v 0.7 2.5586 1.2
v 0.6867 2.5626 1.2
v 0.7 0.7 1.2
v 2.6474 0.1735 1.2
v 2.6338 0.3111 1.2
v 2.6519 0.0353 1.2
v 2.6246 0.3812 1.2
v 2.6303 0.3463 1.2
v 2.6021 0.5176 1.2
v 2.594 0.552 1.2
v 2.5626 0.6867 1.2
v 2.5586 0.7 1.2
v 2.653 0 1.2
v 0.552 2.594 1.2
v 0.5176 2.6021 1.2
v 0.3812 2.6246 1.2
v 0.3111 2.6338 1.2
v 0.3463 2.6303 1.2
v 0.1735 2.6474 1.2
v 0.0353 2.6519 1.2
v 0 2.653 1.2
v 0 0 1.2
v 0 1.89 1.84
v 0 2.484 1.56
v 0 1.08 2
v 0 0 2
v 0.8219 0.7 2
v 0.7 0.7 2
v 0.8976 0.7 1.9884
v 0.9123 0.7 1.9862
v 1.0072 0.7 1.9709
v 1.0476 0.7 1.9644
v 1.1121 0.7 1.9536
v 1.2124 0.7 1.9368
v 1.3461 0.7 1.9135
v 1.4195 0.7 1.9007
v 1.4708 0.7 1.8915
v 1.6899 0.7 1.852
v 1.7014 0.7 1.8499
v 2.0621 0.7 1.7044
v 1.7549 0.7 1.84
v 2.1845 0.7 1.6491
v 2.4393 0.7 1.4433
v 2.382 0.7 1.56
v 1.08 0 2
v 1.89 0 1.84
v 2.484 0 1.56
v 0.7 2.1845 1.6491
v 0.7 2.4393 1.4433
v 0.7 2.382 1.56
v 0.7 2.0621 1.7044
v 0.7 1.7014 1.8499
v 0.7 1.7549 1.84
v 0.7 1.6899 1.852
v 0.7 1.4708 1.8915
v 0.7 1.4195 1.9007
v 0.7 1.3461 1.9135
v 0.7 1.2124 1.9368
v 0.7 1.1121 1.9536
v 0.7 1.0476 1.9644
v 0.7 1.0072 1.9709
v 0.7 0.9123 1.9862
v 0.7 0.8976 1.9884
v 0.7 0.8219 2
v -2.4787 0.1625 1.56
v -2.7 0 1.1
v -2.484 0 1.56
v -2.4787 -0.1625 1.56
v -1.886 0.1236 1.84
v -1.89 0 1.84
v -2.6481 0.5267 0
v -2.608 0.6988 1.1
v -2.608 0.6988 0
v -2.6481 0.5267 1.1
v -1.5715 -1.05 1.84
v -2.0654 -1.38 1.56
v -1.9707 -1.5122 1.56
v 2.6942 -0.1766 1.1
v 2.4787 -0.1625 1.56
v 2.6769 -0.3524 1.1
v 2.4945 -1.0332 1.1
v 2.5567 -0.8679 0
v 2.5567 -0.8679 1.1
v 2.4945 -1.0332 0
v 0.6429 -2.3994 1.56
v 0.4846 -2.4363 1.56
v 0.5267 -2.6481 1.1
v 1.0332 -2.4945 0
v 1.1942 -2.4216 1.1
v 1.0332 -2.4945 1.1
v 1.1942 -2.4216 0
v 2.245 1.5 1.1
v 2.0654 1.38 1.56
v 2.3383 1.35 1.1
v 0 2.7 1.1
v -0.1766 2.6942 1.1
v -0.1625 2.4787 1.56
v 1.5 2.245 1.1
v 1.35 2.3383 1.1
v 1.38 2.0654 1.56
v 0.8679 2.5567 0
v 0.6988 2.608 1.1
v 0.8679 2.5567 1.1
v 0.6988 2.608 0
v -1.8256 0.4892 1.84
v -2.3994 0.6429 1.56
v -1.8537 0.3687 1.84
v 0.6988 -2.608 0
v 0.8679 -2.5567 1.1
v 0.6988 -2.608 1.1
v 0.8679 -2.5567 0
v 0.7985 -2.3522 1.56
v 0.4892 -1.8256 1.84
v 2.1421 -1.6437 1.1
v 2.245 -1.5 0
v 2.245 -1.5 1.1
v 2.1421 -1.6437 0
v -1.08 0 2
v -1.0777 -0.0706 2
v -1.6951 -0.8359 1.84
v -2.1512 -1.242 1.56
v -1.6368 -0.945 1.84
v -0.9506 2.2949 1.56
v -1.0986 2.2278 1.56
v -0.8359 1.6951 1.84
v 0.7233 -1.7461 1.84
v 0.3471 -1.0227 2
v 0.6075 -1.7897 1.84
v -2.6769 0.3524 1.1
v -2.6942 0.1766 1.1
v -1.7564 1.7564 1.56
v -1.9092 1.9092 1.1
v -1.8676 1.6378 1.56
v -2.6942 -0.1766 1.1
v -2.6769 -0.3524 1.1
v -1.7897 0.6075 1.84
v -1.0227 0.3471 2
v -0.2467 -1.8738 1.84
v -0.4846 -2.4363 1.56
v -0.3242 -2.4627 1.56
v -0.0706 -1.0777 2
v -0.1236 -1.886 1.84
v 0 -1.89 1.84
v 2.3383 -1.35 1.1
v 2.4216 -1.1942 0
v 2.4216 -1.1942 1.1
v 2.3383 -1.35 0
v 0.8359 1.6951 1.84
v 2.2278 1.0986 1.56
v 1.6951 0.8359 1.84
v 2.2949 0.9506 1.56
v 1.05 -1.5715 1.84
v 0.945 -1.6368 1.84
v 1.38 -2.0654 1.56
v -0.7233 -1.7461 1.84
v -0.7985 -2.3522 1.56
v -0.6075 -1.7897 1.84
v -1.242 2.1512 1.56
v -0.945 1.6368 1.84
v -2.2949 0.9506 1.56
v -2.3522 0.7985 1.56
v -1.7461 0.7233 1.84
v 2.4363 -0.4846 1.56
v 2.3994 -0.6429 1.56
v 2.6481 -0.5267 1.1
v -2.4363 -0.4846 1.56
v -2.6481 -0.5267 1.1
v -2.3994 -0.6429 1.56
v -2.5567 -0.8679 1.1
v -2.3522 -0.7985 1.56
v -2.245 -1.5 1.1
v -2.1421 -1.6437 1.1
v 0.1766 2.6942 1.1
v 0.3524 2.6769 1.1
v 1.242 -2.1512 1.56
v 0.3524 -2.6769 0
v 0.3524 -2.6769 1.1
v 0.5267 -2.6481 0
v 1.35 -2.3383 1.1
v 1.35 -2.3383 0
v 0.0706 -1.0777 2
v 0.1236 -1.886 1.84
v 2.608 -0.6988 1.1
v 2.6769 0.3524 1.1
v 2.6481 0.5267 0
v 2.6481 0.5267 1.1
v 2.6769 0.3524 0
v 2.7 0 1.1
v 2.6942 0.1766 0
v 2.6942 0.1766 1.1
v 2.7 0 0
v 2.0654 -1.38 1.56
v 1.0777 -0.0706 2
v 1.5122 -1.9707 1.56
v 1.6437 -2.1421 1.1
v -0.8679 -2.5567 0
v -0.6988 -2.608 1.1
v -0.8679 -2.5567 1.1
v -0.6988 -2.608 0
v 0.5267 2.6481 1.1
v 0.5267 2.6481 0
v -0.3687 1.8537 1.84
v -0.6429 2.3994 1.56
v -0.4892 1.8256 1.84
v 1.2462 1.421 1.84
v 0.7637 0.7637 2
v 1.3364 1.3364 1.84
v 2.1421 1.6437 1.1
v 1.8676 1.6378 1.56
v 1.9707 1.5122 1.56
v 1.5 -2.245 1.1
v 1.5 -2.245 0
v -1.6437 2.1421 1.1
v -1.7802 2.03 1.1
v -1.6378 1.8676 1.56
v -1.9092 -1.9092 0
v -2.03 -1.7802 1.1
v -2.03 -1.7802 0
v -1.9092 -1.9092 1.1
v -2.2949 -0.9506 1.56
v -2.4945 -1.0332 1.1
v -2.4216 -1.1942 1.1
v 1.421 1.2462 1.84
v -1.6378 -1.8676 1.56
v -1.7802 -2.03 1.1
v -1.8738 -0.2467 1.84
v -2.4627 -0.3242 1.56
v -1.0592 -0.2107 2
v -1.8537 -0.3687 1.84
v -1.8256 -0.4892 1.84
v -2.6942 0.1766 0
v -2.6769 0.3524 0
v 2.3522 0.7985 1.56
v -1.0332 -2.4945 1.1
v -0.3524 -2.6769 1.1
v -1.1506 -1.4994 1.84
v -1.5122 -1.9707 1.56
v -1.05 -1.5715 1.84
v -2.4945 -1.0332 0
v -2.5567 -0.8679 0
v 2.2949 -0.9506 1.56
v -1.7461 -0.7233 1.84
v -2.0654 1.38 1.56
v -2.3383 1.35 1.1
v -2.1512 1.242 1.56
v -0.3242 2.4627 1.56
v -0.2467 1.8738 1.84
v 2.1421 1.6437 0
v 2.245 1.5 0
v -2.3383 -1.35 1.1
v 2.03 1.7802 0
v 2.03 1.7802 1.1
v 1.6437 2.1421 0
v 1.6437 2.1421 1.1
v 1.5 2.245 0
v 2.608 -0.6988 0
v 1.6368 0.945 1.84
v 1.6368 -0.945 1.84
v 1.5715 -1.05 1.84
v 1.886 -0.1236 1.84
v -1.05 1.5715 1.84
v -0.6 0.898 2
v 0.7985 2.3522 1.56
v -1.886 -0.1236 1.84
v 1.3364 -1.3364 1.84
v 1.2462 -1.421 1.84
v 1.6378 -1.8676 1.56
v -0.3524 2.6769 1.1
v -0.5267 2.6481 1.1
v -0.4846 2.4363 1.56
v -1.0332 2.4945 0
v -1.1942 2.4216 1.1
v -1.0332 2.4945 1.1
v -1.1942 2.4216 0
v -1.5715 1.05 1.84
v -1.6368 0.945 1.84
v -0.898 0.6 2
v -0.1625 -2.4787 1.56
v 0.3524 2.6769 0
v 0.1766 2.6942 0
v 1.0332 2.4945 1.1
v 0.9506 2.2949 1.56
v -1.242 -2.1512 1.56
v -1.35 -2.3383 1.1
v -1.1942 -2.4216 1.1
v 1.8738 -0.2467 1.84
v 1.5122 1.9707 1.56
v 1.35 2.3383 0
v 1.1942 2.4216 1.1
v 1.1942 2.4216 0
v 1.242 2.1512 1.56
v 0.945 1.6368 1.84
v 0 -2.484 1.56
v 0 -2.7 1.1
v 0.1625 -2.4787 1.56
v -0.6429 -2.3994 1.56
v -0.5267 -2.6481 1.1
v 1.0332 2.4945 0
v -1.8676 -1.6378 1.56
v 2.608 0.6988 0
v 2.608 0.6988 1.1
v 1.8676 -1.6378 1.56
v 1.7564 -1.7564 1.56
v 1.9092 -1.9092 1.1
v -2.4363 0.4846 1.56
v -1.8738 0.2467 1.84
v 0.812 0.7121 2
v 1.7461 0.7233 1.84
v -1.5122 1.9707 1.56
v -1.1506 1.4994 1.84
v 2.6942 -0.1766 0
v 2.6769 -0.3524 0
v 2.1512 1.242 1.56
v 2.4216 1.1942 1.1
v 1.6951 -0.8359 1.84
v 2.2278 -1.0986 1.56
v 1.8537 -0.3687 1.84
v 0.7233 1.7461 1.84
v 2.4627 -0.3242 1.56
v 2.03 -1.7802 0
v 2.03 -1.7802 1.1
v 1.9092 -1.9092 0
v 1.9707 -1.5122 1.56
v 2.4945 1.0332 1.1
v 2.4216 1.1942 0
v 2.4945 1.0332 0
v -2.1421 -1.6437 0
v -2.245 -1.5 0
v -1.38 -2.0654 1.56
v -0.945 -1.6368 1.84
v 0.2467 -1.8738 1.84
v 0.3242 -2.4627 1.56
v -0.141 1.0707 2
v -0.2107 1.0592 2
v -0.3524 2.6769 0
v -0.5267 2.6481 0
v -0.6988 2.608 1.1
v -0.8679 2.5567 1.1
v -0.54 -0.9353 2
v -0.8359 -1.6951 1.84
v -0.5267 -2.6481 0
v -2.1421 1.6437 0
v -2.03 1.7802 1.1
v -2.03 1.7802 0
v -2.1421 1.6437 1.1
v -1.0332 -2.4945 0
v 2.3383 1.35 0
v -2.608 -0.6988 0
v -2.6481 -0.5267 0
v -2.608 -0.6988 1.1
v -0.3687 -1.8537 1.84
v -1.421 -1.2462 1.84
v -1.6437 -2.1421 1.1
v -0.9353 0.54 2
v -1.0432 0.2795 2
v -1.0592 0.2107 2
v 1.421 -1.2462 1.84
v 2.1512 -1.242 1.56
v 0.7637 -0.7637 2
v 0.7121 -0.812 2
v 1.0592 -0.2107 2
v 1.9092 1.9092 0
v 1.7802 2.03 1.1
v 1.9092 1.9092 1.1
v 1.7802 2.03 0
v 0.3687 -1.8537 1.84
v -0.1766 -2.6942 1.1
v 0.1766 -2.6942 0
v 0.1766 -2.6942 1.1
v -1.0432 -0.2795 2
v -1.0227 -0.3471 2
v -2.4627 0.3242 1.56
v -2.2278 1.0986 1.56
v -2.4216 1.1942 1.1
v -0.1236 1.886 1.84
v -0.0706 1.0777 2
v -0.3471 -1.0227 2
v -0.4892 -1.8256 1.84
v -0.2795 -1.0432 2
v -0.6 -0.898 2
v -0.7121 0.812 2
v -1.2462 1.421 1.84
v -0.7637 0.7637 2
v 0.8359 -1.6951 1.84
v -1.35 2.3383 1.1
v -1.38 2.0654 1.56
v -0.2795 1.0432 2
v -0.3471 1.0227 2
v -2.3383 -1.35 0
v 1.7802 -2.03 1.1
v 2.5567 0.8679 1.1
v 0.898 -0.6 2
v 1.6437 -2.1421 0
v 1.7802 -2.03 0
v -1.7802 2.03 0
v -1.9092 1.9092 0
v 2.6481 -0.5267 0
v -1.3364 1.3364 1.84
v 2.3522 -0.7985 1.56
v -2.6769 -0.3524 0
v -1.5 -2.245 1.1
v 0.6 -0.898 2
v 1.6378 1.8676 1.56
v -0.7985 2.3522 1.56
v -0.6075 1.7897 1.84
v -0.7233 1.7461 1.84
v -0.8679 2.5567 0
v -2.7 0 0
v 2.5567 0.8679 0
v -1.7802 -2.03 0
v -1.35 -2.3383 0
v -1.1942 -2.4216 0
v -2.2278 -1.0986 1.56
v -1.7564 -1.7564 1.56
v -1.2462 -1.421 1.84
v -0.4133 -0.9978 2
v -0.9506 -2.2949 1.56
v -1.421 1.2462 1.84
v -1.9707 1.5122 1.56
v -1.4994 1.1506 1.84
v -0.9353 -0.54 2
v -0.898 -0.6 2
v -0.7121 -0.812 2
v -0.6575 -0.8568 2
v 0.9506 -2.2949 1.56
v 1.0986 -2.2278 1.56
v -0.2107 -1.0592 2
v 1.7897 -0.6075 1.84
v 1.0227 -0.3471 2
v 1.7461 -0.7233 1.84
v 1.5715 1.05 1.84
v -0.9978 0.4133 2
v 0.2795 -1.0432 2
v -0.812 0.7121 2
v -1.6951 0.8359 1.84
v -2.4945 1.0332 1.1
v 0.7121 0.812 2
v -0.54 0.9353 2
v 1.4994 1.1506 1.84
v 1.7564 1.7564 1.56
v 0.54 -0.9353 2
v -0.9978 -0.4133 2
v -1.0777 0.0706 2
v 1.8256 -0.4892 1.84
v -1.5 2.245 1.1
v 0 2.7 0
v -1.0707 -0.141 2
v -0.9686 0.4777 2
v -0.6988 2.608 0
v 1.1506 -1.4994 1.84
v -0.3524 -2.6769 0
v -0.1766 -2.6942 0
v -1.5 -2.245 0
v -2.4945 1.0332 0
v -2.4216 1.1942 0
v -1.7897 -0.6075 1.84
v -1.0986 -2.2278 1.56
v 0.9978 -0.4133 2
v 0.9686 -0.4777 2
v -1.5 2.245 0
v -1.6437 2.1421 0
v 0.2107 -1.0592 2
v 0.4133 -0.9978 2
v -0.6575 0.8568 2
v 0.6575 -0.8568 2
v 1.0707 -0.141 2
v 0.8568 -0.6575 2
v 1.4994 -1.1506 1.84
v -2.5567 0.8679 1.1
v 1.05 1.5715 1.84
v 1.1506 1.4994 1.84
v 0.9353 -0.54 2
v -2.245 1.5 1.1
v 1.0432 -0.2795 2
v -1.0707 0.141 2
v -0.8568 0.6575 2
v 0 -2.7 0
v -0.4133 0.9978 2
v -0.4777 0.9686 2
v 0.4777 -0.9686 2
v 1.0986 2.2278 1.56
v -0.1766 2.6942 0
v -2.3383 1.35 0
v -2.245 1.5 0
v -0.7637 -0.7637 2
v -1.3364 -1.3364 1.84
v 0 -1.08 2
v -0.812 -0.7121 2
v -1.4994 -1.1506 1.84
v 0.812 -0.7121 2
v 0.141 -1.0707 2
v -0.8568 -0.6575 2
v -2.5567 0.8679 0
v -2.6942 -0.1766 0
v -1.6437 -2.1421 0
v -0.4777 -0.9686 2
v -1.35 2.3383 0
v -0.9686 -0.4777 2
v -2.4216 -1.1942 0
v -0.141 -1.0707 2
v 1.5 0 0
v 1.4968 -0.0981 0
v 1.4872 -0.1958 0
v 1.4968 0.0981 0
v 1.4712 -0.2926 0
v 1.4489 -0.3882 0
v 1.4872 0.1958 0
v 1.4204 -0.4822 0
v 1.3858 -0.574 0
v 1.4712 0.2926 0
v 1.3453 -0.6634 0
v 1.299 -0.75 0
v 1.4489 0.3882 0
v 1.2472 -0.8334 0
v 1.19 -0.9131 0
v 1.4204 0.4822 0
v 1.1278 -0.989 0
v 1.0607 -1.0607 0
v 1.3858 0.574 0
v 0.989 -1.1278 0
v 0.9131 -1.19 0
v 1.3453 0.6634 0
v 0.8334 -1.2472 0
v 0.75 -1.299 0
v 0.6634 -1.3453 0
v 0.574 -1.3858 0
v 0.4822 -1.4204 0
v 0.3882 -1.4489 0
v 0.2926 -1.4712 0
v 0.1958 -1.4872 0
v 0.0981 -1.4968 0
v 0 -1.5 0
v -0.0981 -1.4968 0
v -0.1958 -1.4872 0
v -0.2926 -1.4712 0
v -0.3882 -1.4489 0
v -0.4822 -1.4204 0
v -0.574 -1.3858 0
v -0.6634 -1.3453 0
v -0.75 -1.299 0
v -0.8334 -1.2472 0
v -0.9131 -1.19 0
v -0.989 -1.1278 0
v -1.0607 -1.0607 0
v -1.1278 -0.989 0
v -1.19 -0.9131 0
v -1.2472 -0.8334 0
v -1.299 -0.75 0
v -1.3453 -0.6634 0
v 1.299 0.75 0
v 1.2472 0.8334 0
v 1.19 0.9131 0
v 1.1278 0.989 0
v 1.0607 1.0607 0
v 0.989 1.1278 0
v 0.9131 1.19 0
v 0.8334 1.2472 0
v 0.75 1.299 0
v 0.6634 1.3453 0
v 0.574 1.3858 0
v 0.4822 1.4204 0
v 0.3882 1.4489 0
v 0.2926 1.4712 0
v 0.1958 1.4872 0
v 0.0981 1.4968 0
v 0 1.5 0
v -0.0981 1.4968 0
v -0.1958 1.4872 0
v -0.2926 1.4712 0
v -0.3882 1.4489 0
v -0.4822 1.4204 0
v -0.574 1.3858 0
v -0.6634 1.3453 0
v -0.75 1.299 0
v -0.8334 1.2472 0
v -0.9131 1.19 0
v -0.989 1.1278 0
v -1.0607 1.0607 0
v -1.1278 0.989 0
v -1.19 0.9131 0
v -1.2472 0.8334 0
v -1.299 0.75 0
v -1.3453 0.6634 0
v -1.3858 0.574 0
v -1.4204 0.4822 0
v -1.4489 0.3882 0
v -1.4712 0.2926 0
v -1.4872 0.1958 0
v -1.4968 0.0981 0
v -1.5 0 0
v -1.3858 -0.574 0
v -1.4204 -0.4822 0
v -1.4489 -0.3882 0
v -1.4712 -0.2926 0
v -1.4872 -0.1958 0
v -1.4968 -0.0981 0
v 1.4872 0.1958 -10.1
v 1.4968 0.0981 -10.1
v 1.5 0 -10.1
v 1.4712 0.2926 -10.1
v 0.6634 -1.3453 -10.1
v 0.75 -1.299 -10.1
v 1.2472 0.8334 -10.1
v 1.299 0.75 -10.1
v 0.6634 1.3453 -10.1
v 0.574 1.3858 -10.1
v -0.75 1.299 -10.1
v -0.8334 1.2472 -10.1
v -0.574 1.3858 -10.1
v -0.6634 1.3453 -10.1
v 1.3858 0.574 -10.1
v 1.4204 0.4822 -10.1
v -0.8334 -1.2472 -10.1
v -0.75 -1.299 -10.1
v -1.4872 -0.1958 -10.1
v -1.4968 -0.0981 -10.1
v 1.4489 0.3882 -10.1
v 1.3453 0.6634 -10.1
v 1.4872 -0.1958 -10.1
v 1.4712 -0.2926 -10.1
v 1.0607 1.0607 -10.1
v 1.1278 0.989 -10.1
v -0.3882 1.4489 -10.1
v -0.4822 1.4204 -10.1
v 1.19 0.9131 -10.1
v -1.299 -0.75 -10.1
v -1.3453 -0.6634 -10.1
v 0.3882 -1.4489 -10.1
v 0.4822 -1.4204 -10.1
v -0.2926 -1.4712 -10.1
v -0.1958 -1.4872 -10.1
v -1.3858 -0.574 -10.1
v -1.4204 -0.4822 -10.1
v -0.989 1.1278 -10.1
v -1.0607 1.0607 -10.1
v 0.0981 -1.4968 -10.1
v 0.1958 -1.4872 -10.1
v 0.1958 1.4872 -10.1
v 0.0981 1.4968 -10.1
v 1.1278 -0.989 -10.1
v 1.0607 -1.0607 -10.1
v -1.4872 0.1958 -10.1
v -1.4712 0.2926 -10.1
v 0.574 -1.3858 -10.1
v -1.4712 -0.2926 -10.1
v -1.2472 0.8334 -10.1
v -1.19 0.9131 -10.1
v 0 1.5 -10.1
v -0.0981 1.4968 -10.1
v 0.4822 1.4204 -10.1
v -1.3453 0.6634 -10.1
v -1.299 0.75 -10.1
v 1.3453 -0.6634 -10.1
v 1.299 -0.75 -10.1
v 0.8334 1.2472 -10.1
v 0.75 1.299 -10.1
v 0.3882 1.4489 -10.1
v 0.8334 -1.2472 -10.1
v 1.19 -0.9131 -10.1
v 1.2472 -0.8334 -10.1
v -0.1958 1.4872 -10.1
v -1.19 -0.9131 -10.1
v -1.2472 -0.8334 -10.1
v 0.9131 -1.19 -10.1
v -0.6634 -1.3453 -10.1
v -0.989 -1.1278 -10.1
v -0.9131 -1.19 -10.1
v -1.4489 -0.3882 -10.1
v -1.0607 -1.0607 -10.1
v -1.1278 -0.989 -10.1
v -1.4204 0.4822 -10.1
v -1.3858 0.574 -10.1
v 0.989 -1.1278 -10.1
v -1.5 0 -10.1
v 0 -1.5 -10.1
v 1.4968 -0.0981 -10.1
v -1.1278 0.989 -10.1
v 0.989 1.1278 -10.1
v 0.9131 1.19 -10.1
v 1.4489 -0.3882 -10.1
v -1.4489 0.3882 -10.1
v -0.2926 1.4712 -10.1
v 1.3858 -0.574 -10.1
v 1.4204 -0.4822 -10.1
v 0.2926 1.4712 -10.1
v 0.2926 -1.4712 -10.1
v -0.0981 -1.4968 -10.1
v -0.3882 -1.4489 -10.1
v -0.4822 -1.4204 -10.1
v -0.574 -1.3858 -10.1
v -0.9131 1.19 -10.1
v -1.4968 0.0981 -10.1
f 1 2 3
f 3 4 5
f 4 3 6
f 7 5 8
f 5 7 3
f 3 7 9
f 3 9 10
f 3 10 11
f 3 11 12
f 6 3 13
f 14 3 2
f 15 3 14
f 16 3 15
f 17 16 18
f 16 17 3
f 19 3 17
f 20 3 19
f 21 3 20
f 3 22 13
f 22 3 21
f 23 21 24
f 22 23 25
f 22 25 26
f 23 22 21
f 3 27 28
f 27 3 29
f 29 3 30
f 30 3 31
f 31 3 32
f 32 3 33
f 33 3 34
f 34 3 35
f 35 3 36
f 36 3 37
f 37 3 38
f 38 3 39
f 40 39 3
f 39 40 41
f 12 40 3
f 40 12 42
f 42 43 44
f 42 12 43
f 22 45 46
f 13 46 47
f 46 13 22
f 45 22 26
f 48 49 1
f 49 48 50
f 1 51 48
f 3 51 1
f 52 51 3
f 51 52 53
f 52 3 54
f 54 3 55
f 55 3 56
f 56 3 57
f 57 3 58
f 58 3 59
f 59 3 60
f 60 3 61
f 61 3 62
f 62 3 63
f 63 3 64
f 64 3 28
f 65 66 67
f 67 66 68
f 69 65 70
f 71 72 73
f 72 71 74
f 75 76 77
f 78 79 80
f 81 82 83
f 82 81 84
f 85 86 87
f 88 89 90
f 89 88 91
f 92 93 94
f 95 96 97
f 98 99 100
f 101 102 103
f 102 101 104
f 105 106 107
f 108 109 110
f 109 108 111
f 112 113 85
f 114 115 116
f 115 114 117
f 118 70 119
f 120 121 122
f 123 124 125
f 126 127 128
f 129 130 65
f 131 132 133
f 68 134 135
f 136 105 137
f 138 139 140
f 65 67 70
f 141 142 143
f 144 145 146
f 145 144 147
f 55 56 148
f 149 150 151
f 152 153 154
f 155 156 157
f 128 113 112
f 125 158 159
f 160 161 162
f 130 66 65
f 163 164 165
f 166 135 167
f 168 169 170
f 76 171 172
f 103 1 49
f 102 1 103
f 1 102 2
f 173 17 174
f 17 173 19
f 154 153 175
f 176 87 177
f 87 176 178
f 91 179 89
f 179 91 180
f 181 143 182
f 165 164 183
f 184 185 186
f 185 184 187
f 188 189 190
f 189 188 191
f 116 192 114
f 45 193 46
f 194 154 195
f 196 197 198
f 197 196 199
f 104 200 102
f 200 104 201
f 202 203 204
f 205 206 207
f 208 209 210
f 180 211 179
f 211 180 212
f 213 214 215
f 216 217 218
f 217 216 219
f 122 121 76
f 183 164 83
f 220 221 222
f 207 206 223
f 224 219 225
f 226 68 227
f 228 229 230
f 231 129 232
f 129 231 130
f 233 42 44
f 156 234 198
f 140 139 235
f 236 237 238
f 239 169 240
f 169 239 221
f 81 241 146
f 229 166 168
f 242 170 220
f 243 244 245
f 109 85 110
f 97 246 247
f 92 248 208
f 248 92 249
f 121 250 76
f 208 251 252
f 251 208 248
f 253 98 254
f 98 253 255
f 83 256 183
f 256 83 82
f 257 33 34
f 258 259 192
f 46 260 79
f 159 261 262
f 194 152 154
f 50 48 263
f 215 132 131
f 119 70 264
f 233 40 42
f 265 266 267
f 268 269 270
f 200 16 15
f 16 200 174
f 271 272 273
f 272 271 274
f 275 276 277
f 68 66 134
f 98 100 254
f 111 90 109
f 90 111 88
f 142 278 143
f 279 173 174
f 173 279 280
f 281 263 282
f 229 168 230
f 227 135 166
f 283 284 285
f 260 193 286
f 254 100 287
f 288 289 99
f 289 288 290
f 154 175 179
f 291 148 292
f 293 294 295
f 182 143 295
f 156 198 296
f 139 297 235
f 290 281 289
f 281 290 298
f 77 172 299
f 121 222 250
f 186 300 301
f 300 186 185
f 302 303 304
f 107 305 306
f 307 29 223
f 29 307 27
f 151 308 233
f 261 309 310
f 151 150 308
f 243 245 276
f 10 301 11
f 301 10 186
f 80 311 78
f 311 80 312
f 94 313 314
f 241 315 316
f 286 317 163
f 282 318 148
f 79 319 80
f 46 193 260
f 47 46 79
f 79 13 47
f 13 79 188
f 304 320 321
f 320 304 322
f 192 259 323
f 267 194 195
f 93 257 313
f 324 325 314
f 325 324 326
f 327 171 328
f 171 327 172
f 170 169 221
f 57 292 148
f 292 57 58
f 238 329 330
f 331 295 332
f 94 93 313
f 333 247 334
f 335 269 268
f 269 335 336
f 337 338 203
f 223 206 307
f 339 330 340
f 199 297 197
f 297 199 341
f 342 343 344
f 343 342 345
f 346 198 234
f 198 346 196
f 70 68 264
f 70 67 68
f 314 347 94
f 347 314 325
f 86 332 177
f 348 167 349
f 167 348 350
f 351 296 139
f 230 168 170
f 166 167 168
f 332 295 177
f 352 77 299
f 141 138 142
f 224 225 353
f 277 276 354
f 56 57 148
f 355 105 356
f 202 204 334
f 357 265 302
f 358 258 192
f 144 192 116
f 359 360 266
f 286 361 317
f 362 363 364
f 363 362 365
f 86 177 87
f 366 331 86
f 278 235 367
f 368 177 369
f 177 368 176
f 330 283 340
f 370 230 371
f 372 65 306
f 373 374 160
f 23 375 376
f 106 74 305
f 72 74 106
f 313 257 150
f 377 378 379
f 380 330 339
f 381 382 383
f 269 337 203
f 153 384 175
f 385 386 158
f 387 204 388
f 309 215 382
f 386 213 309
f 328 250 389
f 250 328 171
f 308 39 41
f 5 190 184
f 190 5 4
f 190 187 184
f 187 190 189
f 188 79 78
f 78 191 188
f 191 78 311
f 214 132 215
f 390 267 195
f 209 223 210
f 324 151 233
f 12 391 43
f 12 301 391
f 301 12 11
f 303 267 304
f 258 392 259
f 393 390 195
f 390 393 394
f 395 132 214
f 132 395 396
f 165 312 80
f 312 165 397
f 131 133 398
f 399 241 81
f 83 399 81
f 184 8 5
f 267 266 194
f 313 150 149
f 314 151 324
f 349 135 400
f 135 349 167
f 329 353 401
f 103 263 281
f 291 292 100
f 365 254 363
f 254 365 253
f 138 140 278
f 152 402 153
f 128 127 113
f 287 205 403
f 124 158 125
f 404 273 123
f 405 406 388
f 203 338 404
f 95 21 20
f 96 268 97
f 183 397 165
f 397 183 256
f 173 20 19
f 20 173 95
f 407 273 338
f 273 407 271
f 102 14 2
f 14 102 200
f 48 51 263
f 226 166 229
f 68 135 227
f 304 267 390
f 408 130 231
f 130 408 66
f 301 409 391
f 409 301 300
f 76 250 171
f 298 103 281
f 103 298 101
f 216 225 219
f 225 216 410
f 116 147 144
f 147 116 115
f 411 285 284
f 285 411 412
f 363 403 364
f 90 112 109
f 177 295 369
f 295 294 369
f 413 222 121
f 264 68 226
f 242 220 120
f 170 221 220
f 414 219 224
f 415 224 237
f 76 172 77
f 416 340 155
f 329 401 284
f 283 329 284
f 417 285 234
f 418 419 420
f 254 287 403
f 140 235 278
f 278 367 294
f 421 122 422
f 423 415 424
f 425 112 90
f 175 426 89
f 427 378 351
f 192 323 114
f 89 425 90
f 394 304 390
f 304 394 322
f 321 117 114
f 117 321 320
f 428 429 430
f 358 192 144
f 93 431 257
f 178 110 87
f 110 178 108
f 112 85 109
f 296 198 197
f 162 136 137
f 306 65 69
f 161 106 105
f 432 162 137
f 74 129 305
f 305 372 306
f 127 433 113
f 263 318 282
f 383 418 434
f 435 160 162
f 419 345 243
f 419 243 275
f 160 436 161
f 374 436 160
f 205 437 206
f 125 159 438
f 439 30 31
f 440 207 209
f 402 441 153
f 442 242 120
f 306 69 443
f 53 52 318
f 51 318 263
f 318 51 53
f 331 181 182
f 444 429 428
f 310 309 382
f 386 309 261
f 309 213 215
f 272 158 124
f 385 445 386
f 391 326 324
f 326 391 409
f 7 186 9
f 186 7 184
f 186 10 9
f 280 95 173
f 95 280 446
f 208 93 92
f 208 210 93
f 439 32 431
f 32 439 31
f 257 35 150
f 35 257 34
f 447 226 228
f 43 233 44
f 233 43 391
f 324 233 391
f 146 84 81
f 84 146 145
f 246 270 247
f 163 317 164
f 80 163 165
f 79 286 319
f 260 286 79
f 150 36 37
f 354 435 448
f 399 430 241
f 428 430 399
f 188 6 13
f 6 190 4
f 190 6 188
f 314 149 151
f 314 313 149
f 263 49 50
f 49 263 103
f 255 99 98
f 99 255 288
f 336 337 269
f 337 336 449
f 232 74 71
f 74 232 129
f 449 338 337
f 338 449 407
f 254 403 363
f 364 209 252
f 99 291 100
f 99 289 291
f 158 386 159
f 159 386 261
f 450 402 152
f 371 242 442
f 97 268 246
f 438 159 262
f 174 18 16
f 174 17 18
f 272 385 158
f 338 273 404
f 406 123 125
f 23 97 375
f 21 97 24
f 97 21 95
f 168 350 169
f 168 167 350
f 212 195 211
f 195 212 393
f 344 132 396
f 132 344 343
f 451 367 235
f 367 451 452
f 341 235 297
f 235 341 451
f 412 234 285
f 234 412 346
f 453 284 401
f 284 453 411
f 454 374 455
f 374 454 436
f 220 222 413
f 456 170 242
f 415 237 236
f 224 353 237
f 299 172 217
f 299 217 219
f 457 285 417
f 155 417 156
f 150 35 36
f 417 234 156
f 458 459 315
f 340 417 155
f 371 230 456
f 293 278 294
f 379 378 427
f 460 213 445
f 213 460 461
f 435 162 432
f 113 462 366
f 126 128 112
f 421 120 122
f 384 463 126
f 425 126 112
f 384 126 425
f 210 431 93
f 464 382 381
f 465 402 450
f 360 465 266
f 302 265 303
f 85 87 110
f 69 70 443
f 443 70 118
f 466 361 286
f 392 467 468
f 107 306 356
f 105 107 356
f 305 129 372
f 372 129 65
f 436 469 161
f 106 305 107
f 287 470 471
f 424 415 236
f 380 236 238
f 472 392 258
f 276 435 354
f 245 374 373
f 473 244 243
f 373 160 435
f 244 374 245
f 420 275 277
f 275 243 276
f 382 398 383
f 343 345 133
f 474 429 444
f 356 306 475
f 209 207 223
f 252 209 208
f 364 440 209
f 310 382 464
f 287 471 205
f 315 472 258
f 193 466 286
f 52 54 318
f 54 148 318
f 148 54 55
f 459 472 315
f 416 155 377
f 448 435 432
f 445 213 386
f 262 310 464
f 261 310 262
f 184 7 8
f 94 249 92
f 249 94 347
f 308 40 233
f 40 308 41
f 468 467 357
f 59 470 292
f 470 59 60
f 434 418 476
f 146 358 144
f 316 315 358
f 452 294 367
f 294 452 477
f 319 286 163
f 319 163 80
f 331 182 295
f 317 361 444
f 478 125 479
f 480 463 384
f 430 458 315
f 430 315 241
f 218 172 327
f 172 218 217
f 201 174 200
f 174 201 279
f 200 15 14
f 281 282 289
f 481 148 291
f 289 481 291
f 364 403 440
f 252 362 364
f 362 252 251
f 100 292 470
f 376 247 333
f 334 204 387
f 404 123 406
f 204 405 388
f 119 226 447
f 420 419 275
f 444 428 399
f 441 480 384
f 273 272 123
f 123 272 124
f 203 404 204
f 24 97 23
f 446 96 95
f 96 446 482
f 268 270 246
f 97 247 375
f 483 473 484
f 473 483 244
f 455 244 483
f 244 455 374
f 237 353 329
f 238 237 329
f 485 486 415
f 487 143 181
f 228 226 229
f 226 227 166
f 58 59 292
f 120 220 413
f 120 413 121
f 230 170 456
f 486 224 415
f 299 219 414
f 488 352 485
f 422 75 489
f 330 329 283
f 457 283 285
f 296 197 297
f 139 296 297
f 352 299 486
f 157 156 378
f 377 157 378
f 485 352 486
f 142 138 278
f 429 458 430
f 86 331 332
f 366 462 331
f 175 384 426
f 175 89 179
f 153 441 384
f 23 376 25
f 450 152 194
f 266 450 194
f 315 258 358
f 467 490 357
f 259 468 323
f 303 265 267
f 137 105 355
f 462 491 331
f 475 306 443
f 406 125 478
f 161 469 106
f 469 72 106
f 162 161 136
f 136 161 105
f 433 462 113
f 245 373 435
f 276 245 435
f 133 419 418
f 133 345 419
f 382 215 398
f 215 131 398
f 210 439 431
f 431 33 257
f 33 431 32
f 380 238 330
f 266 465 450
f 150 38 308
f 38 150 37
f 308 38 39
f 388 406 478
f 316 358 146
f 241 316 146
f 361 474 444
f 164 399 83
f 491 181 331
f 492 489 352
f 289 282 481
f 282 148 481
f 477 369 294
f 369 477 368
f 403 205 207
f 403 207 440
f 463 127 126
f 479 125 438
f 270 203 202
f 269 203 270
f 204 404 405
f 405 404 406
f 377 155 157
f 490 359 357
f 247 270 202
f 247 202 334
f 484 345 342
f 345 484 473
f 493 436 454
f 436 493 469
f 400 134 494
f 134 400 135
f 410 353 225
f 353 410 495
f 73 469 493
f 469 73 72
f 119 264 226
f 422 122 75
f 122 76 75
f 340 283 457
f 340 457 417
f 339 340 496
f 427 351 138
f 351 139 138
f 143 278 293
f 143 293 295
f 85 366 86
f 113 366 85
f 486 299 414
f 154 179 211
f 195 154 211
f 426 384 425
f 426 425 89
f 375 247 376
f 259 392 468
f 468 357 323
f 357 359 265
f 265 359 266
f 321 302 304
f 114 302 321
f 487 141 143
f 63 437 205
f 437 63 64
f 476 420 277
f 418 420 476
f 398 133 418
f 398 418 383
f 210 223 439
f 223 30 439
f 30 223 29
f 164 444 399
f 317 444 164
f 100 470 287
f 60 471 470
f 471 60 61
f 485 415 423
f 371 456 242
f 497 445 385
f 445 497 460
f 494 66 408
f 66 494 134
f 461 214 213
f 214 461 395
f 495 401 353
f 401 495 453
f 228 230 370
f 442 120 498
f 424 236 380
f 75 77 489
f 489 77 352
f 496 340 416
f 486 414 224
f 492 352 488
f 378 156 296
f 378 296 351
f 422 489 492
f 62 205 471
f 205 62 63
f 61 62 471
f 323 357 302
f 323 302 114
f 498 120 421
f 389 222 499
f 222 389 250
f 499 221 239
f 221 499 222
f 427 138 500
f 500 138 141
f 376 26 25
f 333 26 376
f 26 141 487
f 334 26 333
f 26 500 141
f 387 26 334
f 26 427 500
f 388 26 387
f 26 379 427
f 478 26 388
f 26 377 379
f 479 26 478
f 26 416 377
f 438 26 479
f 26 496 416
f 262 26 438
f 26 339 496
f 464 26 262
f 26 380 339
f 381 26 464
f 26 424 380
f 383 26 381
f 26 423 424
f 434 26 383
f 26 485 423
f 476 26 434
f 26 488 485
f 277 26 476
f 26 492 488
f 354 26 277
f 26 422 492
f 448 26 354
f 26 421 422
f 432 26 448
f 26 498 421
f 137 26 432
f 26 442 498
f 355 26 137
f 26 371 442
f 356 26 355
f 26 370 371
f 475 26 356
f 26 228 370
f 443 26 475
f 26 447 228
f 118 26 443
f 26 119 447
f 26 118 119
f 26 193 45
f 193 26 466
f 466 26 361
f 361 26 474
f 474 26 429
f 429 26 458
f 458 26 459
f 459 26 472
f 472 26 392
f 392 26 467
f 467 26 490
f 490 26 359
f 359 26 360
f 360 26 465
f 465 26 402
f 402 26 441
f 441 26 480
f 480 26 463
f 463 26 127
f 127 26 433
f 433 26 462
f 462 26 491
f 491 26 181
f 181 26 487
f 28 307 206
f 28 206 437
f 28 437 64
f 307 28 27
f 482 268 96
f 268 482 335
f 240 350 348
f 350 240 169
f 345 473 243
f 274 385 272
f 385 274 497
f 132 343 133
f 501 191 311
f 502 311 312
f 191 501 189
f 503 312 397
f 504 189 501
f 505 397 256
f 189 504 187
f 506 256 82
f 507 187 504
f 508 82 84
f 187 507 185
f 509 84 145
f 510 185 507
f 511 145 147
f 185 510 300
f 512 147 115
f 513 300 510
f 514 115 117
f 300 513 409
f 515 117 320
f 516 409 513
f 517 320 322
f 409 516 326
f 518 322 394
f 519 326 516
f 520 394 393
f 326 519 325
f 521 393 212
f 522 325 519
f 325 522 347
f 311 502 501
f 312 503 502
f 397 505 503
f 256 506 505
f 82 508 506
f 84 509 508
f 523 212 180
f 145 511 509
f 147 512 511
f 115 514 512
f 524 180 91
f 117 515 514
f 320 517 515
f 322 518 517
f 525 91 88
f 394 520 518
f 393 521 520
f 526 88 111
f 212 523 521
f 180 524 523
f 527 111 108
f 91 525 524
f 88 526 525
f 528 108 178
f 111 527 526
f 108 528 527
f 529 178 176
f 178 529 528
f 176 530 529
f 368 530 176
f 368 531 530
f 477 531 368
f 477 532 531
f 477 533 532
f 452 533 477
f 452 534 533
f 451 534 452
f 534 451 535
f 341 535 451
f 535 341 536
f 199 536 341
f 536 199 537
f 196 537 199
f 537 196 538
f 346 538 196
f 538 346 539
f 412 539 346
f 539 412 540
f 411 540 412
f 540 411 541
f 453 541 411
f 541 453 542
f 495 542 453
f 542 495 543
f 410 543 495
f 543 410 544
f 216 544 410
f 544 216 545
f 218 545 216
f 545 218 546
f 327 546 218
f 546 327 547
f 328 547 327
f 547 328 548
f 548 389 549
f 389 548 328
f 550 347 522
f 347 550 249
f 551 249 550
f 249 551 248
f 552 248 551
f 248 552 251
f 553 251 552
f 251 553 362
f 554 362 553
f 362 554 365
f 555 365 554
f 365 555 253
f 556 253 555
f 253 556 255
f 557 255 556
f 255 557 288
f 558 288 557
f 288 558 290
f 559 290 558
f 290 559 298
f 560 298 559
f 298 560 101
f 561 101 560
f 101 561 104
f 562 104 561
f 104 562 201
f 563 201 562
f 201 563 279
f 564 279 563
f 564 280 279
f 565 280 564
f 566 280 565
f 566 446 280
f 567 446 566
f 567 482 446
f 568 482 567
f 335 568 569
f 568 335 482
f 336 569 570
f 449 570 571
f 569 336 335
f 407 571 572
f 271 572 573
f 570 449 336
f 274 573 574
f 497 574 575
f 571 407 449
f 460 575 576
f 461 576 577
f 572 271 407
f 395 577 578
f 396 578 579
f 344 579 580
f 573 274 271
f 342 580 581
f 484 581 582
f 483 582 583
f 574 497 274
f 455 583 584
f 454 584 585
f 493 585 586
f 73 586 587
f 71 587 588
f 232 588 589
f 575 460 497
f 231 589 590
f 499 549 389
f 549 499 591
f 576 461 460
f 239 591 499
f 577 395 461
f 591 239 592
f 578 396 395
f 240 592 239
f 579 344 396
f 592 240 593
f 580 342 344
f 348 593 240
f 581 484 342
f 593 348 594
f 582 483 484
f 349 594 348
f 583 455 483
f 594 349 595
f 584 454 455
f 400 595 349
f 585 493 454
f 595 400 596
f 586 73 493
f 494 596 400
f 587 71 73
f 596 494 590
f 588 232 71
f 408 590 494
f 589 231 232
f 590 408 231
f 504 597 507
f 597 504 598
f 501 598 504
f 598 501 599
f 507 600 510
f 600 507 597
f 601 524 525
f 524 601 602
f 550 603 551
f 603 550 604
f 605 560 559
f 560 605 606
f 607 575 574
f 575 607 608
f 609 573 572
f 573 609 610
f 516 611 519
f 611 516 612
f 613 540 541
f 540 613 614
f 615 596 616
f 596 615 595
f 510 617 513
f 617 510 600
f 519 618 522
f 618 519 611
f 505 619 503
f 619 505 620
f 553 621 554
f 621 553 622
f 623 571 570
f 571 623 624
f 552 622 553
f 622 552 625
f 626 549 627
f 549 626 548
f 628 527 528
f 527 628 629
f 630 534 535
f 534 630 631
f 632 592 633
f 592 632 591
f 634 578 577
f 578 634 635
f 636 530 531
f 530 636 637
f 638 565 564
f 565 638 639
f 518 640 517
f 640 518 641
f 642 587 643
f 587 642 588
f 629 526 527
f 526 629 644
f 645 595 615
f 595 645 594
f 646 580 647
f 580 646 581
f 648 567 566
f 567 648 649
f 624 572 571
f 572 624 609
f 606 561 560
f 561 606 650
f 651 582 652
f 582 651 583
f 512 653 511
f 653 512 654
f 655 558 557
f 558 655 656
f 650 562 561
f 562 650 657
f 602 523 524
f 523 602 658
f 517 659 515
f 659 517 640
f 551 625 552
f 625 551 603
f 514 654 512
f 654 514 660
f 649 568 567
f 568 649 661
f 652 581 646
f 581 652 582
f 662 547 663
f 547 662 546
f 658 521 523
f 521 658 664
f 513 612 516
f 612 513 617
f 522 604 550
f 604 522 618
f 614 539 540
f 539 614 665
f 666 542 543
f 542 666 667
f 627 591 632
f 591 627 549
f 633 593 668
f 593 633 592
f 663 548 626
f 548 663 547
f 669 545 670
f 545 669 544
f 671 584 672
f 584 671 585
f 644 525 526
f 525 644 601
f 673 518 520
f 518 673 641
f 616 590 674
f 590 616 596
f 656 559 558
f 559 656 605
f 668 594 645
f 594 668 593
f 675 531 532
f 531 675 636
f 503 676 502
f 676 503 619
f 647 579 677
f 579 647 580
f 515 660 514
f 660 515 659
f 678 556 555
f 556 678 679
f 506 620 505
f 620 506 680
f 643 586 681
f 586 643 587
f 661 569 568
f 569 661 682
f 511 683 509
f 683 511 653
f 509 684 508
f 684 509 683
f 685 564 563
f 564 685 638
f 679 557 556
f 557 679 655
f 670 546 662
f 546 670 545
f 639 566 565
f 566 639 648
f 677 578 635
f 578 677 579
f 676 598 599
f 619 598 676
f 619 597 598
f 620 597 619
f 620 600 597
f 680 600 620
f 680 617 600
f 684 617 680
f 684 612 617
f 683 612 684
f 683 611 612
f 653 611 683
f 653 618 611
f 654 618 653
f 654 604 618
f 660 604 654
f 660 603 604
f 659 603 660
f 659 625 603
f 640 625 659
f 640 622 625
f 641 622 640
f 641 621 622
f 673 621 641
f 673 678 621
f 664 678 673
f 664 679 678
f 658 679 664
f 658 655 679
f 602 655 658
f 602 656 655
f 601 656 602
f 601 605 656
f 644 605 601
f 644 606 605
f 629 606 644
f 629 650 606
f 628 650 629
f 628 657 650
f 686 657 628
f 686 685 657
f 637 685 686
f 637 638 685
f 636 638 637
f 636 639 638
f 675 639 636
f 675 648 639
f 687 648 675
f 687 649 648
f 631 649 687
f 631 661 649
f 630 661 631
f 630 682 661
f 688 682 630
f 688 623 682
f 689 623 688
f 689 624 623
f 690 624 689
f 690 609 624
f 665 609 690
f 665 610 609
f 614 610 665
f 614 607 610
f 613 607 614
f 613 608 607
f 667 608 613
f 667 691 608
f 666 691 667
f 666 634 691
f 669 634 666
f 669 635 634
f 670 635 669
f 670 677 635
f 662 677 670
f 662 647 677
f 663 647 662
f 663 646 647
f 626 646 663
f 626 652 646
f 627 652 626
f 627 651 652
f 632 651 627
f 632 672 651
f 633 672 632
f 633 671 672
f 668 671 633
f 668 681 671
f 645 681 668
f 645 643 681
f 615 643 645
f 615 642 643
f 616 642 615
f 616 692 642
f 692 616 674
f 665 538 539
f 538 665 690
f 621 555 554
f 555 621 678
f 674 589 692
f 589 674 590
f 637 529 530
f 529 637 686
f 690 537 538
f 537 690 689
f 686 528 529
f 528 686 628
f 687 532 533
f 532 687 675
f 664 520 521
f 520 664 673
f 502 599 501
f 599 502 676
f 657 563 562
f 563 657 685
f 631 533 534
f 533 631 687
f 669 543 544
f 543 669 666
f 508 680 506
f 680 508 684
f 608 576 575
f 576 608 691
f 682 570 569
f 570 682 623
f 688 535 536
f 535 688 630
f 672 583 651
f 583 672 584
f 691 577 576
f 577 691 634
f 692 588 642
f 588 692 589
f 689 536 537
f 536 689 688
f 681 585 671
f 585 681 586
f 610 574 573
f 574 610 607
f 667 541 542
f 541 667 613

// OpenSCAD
// Pan head screw (single connected solid)
// Specs: 3.0mm shaft diameter, 5.4mm head diameter, 2.0mm head height, 10mm length under head

$fn = 96;

// Parameters (mm)
shaft_diameter_mm      = 3.0;
length_under_head_mm   = 10.0;
head_diameter_mm       = 5.4;
head_height_mm         = 2.0;

// Simple Phillips-like recess (optional but kept within head)
recess_depth_mm        = 0.8;
recess_width_mm        = 0.7;
recess_radius_factor   = 0.55;

// Small overlap to ensure watertight union
overlap_mm             = 0.2;

// Derived
shaft_r = shaft_diameter_mm/2;
head_r  = head_diameter_mm/2;

// Pan head profile (rounded top) via rotate_extrude of a 2D section
module pan_head(h=head_height_mm, r=head_r) {
    // z=0 at underside of head, z=h at top
    rotate_extrude(convexity=10)
        polygon(points=[
            [0, 0],
            [r, 0],
            [r, h*0.55],
            [r*0.92, h*0.78],
            [r*0.70, h*0.92],
            [r*0.40, h],
            [0, h]
        ]);
}

module screw() {
    union() {
        // Shaft: from z = -length_under_head to z = 0 (touches head underside)
        translate([0,0,-length_under_head_mm/2])
            cylinder(h=length_under_head_mm + overlap_mm, r=shaft_r, center=true);

        // Head: underside at z=0
        translate([0,0,0])
            difference() {
                pan_head(h=head_height_mm, r=head_r);

                // Recess cut from top, kept shallow
                translate([0,0,head_height_mm - recess_depth_mm])
                    union() {
                        cube([head_diameter_mm*recess_radius_factor*2, recess_width_mm, recess_depth_mm + overlap_mm], center=false);
                        cube([recess_width_mm, head_diameter_mm*recess_radius_factor*2, recess_depth_mm + overlap_mm], center=false);
                    }
            }
    }
}

screw();
